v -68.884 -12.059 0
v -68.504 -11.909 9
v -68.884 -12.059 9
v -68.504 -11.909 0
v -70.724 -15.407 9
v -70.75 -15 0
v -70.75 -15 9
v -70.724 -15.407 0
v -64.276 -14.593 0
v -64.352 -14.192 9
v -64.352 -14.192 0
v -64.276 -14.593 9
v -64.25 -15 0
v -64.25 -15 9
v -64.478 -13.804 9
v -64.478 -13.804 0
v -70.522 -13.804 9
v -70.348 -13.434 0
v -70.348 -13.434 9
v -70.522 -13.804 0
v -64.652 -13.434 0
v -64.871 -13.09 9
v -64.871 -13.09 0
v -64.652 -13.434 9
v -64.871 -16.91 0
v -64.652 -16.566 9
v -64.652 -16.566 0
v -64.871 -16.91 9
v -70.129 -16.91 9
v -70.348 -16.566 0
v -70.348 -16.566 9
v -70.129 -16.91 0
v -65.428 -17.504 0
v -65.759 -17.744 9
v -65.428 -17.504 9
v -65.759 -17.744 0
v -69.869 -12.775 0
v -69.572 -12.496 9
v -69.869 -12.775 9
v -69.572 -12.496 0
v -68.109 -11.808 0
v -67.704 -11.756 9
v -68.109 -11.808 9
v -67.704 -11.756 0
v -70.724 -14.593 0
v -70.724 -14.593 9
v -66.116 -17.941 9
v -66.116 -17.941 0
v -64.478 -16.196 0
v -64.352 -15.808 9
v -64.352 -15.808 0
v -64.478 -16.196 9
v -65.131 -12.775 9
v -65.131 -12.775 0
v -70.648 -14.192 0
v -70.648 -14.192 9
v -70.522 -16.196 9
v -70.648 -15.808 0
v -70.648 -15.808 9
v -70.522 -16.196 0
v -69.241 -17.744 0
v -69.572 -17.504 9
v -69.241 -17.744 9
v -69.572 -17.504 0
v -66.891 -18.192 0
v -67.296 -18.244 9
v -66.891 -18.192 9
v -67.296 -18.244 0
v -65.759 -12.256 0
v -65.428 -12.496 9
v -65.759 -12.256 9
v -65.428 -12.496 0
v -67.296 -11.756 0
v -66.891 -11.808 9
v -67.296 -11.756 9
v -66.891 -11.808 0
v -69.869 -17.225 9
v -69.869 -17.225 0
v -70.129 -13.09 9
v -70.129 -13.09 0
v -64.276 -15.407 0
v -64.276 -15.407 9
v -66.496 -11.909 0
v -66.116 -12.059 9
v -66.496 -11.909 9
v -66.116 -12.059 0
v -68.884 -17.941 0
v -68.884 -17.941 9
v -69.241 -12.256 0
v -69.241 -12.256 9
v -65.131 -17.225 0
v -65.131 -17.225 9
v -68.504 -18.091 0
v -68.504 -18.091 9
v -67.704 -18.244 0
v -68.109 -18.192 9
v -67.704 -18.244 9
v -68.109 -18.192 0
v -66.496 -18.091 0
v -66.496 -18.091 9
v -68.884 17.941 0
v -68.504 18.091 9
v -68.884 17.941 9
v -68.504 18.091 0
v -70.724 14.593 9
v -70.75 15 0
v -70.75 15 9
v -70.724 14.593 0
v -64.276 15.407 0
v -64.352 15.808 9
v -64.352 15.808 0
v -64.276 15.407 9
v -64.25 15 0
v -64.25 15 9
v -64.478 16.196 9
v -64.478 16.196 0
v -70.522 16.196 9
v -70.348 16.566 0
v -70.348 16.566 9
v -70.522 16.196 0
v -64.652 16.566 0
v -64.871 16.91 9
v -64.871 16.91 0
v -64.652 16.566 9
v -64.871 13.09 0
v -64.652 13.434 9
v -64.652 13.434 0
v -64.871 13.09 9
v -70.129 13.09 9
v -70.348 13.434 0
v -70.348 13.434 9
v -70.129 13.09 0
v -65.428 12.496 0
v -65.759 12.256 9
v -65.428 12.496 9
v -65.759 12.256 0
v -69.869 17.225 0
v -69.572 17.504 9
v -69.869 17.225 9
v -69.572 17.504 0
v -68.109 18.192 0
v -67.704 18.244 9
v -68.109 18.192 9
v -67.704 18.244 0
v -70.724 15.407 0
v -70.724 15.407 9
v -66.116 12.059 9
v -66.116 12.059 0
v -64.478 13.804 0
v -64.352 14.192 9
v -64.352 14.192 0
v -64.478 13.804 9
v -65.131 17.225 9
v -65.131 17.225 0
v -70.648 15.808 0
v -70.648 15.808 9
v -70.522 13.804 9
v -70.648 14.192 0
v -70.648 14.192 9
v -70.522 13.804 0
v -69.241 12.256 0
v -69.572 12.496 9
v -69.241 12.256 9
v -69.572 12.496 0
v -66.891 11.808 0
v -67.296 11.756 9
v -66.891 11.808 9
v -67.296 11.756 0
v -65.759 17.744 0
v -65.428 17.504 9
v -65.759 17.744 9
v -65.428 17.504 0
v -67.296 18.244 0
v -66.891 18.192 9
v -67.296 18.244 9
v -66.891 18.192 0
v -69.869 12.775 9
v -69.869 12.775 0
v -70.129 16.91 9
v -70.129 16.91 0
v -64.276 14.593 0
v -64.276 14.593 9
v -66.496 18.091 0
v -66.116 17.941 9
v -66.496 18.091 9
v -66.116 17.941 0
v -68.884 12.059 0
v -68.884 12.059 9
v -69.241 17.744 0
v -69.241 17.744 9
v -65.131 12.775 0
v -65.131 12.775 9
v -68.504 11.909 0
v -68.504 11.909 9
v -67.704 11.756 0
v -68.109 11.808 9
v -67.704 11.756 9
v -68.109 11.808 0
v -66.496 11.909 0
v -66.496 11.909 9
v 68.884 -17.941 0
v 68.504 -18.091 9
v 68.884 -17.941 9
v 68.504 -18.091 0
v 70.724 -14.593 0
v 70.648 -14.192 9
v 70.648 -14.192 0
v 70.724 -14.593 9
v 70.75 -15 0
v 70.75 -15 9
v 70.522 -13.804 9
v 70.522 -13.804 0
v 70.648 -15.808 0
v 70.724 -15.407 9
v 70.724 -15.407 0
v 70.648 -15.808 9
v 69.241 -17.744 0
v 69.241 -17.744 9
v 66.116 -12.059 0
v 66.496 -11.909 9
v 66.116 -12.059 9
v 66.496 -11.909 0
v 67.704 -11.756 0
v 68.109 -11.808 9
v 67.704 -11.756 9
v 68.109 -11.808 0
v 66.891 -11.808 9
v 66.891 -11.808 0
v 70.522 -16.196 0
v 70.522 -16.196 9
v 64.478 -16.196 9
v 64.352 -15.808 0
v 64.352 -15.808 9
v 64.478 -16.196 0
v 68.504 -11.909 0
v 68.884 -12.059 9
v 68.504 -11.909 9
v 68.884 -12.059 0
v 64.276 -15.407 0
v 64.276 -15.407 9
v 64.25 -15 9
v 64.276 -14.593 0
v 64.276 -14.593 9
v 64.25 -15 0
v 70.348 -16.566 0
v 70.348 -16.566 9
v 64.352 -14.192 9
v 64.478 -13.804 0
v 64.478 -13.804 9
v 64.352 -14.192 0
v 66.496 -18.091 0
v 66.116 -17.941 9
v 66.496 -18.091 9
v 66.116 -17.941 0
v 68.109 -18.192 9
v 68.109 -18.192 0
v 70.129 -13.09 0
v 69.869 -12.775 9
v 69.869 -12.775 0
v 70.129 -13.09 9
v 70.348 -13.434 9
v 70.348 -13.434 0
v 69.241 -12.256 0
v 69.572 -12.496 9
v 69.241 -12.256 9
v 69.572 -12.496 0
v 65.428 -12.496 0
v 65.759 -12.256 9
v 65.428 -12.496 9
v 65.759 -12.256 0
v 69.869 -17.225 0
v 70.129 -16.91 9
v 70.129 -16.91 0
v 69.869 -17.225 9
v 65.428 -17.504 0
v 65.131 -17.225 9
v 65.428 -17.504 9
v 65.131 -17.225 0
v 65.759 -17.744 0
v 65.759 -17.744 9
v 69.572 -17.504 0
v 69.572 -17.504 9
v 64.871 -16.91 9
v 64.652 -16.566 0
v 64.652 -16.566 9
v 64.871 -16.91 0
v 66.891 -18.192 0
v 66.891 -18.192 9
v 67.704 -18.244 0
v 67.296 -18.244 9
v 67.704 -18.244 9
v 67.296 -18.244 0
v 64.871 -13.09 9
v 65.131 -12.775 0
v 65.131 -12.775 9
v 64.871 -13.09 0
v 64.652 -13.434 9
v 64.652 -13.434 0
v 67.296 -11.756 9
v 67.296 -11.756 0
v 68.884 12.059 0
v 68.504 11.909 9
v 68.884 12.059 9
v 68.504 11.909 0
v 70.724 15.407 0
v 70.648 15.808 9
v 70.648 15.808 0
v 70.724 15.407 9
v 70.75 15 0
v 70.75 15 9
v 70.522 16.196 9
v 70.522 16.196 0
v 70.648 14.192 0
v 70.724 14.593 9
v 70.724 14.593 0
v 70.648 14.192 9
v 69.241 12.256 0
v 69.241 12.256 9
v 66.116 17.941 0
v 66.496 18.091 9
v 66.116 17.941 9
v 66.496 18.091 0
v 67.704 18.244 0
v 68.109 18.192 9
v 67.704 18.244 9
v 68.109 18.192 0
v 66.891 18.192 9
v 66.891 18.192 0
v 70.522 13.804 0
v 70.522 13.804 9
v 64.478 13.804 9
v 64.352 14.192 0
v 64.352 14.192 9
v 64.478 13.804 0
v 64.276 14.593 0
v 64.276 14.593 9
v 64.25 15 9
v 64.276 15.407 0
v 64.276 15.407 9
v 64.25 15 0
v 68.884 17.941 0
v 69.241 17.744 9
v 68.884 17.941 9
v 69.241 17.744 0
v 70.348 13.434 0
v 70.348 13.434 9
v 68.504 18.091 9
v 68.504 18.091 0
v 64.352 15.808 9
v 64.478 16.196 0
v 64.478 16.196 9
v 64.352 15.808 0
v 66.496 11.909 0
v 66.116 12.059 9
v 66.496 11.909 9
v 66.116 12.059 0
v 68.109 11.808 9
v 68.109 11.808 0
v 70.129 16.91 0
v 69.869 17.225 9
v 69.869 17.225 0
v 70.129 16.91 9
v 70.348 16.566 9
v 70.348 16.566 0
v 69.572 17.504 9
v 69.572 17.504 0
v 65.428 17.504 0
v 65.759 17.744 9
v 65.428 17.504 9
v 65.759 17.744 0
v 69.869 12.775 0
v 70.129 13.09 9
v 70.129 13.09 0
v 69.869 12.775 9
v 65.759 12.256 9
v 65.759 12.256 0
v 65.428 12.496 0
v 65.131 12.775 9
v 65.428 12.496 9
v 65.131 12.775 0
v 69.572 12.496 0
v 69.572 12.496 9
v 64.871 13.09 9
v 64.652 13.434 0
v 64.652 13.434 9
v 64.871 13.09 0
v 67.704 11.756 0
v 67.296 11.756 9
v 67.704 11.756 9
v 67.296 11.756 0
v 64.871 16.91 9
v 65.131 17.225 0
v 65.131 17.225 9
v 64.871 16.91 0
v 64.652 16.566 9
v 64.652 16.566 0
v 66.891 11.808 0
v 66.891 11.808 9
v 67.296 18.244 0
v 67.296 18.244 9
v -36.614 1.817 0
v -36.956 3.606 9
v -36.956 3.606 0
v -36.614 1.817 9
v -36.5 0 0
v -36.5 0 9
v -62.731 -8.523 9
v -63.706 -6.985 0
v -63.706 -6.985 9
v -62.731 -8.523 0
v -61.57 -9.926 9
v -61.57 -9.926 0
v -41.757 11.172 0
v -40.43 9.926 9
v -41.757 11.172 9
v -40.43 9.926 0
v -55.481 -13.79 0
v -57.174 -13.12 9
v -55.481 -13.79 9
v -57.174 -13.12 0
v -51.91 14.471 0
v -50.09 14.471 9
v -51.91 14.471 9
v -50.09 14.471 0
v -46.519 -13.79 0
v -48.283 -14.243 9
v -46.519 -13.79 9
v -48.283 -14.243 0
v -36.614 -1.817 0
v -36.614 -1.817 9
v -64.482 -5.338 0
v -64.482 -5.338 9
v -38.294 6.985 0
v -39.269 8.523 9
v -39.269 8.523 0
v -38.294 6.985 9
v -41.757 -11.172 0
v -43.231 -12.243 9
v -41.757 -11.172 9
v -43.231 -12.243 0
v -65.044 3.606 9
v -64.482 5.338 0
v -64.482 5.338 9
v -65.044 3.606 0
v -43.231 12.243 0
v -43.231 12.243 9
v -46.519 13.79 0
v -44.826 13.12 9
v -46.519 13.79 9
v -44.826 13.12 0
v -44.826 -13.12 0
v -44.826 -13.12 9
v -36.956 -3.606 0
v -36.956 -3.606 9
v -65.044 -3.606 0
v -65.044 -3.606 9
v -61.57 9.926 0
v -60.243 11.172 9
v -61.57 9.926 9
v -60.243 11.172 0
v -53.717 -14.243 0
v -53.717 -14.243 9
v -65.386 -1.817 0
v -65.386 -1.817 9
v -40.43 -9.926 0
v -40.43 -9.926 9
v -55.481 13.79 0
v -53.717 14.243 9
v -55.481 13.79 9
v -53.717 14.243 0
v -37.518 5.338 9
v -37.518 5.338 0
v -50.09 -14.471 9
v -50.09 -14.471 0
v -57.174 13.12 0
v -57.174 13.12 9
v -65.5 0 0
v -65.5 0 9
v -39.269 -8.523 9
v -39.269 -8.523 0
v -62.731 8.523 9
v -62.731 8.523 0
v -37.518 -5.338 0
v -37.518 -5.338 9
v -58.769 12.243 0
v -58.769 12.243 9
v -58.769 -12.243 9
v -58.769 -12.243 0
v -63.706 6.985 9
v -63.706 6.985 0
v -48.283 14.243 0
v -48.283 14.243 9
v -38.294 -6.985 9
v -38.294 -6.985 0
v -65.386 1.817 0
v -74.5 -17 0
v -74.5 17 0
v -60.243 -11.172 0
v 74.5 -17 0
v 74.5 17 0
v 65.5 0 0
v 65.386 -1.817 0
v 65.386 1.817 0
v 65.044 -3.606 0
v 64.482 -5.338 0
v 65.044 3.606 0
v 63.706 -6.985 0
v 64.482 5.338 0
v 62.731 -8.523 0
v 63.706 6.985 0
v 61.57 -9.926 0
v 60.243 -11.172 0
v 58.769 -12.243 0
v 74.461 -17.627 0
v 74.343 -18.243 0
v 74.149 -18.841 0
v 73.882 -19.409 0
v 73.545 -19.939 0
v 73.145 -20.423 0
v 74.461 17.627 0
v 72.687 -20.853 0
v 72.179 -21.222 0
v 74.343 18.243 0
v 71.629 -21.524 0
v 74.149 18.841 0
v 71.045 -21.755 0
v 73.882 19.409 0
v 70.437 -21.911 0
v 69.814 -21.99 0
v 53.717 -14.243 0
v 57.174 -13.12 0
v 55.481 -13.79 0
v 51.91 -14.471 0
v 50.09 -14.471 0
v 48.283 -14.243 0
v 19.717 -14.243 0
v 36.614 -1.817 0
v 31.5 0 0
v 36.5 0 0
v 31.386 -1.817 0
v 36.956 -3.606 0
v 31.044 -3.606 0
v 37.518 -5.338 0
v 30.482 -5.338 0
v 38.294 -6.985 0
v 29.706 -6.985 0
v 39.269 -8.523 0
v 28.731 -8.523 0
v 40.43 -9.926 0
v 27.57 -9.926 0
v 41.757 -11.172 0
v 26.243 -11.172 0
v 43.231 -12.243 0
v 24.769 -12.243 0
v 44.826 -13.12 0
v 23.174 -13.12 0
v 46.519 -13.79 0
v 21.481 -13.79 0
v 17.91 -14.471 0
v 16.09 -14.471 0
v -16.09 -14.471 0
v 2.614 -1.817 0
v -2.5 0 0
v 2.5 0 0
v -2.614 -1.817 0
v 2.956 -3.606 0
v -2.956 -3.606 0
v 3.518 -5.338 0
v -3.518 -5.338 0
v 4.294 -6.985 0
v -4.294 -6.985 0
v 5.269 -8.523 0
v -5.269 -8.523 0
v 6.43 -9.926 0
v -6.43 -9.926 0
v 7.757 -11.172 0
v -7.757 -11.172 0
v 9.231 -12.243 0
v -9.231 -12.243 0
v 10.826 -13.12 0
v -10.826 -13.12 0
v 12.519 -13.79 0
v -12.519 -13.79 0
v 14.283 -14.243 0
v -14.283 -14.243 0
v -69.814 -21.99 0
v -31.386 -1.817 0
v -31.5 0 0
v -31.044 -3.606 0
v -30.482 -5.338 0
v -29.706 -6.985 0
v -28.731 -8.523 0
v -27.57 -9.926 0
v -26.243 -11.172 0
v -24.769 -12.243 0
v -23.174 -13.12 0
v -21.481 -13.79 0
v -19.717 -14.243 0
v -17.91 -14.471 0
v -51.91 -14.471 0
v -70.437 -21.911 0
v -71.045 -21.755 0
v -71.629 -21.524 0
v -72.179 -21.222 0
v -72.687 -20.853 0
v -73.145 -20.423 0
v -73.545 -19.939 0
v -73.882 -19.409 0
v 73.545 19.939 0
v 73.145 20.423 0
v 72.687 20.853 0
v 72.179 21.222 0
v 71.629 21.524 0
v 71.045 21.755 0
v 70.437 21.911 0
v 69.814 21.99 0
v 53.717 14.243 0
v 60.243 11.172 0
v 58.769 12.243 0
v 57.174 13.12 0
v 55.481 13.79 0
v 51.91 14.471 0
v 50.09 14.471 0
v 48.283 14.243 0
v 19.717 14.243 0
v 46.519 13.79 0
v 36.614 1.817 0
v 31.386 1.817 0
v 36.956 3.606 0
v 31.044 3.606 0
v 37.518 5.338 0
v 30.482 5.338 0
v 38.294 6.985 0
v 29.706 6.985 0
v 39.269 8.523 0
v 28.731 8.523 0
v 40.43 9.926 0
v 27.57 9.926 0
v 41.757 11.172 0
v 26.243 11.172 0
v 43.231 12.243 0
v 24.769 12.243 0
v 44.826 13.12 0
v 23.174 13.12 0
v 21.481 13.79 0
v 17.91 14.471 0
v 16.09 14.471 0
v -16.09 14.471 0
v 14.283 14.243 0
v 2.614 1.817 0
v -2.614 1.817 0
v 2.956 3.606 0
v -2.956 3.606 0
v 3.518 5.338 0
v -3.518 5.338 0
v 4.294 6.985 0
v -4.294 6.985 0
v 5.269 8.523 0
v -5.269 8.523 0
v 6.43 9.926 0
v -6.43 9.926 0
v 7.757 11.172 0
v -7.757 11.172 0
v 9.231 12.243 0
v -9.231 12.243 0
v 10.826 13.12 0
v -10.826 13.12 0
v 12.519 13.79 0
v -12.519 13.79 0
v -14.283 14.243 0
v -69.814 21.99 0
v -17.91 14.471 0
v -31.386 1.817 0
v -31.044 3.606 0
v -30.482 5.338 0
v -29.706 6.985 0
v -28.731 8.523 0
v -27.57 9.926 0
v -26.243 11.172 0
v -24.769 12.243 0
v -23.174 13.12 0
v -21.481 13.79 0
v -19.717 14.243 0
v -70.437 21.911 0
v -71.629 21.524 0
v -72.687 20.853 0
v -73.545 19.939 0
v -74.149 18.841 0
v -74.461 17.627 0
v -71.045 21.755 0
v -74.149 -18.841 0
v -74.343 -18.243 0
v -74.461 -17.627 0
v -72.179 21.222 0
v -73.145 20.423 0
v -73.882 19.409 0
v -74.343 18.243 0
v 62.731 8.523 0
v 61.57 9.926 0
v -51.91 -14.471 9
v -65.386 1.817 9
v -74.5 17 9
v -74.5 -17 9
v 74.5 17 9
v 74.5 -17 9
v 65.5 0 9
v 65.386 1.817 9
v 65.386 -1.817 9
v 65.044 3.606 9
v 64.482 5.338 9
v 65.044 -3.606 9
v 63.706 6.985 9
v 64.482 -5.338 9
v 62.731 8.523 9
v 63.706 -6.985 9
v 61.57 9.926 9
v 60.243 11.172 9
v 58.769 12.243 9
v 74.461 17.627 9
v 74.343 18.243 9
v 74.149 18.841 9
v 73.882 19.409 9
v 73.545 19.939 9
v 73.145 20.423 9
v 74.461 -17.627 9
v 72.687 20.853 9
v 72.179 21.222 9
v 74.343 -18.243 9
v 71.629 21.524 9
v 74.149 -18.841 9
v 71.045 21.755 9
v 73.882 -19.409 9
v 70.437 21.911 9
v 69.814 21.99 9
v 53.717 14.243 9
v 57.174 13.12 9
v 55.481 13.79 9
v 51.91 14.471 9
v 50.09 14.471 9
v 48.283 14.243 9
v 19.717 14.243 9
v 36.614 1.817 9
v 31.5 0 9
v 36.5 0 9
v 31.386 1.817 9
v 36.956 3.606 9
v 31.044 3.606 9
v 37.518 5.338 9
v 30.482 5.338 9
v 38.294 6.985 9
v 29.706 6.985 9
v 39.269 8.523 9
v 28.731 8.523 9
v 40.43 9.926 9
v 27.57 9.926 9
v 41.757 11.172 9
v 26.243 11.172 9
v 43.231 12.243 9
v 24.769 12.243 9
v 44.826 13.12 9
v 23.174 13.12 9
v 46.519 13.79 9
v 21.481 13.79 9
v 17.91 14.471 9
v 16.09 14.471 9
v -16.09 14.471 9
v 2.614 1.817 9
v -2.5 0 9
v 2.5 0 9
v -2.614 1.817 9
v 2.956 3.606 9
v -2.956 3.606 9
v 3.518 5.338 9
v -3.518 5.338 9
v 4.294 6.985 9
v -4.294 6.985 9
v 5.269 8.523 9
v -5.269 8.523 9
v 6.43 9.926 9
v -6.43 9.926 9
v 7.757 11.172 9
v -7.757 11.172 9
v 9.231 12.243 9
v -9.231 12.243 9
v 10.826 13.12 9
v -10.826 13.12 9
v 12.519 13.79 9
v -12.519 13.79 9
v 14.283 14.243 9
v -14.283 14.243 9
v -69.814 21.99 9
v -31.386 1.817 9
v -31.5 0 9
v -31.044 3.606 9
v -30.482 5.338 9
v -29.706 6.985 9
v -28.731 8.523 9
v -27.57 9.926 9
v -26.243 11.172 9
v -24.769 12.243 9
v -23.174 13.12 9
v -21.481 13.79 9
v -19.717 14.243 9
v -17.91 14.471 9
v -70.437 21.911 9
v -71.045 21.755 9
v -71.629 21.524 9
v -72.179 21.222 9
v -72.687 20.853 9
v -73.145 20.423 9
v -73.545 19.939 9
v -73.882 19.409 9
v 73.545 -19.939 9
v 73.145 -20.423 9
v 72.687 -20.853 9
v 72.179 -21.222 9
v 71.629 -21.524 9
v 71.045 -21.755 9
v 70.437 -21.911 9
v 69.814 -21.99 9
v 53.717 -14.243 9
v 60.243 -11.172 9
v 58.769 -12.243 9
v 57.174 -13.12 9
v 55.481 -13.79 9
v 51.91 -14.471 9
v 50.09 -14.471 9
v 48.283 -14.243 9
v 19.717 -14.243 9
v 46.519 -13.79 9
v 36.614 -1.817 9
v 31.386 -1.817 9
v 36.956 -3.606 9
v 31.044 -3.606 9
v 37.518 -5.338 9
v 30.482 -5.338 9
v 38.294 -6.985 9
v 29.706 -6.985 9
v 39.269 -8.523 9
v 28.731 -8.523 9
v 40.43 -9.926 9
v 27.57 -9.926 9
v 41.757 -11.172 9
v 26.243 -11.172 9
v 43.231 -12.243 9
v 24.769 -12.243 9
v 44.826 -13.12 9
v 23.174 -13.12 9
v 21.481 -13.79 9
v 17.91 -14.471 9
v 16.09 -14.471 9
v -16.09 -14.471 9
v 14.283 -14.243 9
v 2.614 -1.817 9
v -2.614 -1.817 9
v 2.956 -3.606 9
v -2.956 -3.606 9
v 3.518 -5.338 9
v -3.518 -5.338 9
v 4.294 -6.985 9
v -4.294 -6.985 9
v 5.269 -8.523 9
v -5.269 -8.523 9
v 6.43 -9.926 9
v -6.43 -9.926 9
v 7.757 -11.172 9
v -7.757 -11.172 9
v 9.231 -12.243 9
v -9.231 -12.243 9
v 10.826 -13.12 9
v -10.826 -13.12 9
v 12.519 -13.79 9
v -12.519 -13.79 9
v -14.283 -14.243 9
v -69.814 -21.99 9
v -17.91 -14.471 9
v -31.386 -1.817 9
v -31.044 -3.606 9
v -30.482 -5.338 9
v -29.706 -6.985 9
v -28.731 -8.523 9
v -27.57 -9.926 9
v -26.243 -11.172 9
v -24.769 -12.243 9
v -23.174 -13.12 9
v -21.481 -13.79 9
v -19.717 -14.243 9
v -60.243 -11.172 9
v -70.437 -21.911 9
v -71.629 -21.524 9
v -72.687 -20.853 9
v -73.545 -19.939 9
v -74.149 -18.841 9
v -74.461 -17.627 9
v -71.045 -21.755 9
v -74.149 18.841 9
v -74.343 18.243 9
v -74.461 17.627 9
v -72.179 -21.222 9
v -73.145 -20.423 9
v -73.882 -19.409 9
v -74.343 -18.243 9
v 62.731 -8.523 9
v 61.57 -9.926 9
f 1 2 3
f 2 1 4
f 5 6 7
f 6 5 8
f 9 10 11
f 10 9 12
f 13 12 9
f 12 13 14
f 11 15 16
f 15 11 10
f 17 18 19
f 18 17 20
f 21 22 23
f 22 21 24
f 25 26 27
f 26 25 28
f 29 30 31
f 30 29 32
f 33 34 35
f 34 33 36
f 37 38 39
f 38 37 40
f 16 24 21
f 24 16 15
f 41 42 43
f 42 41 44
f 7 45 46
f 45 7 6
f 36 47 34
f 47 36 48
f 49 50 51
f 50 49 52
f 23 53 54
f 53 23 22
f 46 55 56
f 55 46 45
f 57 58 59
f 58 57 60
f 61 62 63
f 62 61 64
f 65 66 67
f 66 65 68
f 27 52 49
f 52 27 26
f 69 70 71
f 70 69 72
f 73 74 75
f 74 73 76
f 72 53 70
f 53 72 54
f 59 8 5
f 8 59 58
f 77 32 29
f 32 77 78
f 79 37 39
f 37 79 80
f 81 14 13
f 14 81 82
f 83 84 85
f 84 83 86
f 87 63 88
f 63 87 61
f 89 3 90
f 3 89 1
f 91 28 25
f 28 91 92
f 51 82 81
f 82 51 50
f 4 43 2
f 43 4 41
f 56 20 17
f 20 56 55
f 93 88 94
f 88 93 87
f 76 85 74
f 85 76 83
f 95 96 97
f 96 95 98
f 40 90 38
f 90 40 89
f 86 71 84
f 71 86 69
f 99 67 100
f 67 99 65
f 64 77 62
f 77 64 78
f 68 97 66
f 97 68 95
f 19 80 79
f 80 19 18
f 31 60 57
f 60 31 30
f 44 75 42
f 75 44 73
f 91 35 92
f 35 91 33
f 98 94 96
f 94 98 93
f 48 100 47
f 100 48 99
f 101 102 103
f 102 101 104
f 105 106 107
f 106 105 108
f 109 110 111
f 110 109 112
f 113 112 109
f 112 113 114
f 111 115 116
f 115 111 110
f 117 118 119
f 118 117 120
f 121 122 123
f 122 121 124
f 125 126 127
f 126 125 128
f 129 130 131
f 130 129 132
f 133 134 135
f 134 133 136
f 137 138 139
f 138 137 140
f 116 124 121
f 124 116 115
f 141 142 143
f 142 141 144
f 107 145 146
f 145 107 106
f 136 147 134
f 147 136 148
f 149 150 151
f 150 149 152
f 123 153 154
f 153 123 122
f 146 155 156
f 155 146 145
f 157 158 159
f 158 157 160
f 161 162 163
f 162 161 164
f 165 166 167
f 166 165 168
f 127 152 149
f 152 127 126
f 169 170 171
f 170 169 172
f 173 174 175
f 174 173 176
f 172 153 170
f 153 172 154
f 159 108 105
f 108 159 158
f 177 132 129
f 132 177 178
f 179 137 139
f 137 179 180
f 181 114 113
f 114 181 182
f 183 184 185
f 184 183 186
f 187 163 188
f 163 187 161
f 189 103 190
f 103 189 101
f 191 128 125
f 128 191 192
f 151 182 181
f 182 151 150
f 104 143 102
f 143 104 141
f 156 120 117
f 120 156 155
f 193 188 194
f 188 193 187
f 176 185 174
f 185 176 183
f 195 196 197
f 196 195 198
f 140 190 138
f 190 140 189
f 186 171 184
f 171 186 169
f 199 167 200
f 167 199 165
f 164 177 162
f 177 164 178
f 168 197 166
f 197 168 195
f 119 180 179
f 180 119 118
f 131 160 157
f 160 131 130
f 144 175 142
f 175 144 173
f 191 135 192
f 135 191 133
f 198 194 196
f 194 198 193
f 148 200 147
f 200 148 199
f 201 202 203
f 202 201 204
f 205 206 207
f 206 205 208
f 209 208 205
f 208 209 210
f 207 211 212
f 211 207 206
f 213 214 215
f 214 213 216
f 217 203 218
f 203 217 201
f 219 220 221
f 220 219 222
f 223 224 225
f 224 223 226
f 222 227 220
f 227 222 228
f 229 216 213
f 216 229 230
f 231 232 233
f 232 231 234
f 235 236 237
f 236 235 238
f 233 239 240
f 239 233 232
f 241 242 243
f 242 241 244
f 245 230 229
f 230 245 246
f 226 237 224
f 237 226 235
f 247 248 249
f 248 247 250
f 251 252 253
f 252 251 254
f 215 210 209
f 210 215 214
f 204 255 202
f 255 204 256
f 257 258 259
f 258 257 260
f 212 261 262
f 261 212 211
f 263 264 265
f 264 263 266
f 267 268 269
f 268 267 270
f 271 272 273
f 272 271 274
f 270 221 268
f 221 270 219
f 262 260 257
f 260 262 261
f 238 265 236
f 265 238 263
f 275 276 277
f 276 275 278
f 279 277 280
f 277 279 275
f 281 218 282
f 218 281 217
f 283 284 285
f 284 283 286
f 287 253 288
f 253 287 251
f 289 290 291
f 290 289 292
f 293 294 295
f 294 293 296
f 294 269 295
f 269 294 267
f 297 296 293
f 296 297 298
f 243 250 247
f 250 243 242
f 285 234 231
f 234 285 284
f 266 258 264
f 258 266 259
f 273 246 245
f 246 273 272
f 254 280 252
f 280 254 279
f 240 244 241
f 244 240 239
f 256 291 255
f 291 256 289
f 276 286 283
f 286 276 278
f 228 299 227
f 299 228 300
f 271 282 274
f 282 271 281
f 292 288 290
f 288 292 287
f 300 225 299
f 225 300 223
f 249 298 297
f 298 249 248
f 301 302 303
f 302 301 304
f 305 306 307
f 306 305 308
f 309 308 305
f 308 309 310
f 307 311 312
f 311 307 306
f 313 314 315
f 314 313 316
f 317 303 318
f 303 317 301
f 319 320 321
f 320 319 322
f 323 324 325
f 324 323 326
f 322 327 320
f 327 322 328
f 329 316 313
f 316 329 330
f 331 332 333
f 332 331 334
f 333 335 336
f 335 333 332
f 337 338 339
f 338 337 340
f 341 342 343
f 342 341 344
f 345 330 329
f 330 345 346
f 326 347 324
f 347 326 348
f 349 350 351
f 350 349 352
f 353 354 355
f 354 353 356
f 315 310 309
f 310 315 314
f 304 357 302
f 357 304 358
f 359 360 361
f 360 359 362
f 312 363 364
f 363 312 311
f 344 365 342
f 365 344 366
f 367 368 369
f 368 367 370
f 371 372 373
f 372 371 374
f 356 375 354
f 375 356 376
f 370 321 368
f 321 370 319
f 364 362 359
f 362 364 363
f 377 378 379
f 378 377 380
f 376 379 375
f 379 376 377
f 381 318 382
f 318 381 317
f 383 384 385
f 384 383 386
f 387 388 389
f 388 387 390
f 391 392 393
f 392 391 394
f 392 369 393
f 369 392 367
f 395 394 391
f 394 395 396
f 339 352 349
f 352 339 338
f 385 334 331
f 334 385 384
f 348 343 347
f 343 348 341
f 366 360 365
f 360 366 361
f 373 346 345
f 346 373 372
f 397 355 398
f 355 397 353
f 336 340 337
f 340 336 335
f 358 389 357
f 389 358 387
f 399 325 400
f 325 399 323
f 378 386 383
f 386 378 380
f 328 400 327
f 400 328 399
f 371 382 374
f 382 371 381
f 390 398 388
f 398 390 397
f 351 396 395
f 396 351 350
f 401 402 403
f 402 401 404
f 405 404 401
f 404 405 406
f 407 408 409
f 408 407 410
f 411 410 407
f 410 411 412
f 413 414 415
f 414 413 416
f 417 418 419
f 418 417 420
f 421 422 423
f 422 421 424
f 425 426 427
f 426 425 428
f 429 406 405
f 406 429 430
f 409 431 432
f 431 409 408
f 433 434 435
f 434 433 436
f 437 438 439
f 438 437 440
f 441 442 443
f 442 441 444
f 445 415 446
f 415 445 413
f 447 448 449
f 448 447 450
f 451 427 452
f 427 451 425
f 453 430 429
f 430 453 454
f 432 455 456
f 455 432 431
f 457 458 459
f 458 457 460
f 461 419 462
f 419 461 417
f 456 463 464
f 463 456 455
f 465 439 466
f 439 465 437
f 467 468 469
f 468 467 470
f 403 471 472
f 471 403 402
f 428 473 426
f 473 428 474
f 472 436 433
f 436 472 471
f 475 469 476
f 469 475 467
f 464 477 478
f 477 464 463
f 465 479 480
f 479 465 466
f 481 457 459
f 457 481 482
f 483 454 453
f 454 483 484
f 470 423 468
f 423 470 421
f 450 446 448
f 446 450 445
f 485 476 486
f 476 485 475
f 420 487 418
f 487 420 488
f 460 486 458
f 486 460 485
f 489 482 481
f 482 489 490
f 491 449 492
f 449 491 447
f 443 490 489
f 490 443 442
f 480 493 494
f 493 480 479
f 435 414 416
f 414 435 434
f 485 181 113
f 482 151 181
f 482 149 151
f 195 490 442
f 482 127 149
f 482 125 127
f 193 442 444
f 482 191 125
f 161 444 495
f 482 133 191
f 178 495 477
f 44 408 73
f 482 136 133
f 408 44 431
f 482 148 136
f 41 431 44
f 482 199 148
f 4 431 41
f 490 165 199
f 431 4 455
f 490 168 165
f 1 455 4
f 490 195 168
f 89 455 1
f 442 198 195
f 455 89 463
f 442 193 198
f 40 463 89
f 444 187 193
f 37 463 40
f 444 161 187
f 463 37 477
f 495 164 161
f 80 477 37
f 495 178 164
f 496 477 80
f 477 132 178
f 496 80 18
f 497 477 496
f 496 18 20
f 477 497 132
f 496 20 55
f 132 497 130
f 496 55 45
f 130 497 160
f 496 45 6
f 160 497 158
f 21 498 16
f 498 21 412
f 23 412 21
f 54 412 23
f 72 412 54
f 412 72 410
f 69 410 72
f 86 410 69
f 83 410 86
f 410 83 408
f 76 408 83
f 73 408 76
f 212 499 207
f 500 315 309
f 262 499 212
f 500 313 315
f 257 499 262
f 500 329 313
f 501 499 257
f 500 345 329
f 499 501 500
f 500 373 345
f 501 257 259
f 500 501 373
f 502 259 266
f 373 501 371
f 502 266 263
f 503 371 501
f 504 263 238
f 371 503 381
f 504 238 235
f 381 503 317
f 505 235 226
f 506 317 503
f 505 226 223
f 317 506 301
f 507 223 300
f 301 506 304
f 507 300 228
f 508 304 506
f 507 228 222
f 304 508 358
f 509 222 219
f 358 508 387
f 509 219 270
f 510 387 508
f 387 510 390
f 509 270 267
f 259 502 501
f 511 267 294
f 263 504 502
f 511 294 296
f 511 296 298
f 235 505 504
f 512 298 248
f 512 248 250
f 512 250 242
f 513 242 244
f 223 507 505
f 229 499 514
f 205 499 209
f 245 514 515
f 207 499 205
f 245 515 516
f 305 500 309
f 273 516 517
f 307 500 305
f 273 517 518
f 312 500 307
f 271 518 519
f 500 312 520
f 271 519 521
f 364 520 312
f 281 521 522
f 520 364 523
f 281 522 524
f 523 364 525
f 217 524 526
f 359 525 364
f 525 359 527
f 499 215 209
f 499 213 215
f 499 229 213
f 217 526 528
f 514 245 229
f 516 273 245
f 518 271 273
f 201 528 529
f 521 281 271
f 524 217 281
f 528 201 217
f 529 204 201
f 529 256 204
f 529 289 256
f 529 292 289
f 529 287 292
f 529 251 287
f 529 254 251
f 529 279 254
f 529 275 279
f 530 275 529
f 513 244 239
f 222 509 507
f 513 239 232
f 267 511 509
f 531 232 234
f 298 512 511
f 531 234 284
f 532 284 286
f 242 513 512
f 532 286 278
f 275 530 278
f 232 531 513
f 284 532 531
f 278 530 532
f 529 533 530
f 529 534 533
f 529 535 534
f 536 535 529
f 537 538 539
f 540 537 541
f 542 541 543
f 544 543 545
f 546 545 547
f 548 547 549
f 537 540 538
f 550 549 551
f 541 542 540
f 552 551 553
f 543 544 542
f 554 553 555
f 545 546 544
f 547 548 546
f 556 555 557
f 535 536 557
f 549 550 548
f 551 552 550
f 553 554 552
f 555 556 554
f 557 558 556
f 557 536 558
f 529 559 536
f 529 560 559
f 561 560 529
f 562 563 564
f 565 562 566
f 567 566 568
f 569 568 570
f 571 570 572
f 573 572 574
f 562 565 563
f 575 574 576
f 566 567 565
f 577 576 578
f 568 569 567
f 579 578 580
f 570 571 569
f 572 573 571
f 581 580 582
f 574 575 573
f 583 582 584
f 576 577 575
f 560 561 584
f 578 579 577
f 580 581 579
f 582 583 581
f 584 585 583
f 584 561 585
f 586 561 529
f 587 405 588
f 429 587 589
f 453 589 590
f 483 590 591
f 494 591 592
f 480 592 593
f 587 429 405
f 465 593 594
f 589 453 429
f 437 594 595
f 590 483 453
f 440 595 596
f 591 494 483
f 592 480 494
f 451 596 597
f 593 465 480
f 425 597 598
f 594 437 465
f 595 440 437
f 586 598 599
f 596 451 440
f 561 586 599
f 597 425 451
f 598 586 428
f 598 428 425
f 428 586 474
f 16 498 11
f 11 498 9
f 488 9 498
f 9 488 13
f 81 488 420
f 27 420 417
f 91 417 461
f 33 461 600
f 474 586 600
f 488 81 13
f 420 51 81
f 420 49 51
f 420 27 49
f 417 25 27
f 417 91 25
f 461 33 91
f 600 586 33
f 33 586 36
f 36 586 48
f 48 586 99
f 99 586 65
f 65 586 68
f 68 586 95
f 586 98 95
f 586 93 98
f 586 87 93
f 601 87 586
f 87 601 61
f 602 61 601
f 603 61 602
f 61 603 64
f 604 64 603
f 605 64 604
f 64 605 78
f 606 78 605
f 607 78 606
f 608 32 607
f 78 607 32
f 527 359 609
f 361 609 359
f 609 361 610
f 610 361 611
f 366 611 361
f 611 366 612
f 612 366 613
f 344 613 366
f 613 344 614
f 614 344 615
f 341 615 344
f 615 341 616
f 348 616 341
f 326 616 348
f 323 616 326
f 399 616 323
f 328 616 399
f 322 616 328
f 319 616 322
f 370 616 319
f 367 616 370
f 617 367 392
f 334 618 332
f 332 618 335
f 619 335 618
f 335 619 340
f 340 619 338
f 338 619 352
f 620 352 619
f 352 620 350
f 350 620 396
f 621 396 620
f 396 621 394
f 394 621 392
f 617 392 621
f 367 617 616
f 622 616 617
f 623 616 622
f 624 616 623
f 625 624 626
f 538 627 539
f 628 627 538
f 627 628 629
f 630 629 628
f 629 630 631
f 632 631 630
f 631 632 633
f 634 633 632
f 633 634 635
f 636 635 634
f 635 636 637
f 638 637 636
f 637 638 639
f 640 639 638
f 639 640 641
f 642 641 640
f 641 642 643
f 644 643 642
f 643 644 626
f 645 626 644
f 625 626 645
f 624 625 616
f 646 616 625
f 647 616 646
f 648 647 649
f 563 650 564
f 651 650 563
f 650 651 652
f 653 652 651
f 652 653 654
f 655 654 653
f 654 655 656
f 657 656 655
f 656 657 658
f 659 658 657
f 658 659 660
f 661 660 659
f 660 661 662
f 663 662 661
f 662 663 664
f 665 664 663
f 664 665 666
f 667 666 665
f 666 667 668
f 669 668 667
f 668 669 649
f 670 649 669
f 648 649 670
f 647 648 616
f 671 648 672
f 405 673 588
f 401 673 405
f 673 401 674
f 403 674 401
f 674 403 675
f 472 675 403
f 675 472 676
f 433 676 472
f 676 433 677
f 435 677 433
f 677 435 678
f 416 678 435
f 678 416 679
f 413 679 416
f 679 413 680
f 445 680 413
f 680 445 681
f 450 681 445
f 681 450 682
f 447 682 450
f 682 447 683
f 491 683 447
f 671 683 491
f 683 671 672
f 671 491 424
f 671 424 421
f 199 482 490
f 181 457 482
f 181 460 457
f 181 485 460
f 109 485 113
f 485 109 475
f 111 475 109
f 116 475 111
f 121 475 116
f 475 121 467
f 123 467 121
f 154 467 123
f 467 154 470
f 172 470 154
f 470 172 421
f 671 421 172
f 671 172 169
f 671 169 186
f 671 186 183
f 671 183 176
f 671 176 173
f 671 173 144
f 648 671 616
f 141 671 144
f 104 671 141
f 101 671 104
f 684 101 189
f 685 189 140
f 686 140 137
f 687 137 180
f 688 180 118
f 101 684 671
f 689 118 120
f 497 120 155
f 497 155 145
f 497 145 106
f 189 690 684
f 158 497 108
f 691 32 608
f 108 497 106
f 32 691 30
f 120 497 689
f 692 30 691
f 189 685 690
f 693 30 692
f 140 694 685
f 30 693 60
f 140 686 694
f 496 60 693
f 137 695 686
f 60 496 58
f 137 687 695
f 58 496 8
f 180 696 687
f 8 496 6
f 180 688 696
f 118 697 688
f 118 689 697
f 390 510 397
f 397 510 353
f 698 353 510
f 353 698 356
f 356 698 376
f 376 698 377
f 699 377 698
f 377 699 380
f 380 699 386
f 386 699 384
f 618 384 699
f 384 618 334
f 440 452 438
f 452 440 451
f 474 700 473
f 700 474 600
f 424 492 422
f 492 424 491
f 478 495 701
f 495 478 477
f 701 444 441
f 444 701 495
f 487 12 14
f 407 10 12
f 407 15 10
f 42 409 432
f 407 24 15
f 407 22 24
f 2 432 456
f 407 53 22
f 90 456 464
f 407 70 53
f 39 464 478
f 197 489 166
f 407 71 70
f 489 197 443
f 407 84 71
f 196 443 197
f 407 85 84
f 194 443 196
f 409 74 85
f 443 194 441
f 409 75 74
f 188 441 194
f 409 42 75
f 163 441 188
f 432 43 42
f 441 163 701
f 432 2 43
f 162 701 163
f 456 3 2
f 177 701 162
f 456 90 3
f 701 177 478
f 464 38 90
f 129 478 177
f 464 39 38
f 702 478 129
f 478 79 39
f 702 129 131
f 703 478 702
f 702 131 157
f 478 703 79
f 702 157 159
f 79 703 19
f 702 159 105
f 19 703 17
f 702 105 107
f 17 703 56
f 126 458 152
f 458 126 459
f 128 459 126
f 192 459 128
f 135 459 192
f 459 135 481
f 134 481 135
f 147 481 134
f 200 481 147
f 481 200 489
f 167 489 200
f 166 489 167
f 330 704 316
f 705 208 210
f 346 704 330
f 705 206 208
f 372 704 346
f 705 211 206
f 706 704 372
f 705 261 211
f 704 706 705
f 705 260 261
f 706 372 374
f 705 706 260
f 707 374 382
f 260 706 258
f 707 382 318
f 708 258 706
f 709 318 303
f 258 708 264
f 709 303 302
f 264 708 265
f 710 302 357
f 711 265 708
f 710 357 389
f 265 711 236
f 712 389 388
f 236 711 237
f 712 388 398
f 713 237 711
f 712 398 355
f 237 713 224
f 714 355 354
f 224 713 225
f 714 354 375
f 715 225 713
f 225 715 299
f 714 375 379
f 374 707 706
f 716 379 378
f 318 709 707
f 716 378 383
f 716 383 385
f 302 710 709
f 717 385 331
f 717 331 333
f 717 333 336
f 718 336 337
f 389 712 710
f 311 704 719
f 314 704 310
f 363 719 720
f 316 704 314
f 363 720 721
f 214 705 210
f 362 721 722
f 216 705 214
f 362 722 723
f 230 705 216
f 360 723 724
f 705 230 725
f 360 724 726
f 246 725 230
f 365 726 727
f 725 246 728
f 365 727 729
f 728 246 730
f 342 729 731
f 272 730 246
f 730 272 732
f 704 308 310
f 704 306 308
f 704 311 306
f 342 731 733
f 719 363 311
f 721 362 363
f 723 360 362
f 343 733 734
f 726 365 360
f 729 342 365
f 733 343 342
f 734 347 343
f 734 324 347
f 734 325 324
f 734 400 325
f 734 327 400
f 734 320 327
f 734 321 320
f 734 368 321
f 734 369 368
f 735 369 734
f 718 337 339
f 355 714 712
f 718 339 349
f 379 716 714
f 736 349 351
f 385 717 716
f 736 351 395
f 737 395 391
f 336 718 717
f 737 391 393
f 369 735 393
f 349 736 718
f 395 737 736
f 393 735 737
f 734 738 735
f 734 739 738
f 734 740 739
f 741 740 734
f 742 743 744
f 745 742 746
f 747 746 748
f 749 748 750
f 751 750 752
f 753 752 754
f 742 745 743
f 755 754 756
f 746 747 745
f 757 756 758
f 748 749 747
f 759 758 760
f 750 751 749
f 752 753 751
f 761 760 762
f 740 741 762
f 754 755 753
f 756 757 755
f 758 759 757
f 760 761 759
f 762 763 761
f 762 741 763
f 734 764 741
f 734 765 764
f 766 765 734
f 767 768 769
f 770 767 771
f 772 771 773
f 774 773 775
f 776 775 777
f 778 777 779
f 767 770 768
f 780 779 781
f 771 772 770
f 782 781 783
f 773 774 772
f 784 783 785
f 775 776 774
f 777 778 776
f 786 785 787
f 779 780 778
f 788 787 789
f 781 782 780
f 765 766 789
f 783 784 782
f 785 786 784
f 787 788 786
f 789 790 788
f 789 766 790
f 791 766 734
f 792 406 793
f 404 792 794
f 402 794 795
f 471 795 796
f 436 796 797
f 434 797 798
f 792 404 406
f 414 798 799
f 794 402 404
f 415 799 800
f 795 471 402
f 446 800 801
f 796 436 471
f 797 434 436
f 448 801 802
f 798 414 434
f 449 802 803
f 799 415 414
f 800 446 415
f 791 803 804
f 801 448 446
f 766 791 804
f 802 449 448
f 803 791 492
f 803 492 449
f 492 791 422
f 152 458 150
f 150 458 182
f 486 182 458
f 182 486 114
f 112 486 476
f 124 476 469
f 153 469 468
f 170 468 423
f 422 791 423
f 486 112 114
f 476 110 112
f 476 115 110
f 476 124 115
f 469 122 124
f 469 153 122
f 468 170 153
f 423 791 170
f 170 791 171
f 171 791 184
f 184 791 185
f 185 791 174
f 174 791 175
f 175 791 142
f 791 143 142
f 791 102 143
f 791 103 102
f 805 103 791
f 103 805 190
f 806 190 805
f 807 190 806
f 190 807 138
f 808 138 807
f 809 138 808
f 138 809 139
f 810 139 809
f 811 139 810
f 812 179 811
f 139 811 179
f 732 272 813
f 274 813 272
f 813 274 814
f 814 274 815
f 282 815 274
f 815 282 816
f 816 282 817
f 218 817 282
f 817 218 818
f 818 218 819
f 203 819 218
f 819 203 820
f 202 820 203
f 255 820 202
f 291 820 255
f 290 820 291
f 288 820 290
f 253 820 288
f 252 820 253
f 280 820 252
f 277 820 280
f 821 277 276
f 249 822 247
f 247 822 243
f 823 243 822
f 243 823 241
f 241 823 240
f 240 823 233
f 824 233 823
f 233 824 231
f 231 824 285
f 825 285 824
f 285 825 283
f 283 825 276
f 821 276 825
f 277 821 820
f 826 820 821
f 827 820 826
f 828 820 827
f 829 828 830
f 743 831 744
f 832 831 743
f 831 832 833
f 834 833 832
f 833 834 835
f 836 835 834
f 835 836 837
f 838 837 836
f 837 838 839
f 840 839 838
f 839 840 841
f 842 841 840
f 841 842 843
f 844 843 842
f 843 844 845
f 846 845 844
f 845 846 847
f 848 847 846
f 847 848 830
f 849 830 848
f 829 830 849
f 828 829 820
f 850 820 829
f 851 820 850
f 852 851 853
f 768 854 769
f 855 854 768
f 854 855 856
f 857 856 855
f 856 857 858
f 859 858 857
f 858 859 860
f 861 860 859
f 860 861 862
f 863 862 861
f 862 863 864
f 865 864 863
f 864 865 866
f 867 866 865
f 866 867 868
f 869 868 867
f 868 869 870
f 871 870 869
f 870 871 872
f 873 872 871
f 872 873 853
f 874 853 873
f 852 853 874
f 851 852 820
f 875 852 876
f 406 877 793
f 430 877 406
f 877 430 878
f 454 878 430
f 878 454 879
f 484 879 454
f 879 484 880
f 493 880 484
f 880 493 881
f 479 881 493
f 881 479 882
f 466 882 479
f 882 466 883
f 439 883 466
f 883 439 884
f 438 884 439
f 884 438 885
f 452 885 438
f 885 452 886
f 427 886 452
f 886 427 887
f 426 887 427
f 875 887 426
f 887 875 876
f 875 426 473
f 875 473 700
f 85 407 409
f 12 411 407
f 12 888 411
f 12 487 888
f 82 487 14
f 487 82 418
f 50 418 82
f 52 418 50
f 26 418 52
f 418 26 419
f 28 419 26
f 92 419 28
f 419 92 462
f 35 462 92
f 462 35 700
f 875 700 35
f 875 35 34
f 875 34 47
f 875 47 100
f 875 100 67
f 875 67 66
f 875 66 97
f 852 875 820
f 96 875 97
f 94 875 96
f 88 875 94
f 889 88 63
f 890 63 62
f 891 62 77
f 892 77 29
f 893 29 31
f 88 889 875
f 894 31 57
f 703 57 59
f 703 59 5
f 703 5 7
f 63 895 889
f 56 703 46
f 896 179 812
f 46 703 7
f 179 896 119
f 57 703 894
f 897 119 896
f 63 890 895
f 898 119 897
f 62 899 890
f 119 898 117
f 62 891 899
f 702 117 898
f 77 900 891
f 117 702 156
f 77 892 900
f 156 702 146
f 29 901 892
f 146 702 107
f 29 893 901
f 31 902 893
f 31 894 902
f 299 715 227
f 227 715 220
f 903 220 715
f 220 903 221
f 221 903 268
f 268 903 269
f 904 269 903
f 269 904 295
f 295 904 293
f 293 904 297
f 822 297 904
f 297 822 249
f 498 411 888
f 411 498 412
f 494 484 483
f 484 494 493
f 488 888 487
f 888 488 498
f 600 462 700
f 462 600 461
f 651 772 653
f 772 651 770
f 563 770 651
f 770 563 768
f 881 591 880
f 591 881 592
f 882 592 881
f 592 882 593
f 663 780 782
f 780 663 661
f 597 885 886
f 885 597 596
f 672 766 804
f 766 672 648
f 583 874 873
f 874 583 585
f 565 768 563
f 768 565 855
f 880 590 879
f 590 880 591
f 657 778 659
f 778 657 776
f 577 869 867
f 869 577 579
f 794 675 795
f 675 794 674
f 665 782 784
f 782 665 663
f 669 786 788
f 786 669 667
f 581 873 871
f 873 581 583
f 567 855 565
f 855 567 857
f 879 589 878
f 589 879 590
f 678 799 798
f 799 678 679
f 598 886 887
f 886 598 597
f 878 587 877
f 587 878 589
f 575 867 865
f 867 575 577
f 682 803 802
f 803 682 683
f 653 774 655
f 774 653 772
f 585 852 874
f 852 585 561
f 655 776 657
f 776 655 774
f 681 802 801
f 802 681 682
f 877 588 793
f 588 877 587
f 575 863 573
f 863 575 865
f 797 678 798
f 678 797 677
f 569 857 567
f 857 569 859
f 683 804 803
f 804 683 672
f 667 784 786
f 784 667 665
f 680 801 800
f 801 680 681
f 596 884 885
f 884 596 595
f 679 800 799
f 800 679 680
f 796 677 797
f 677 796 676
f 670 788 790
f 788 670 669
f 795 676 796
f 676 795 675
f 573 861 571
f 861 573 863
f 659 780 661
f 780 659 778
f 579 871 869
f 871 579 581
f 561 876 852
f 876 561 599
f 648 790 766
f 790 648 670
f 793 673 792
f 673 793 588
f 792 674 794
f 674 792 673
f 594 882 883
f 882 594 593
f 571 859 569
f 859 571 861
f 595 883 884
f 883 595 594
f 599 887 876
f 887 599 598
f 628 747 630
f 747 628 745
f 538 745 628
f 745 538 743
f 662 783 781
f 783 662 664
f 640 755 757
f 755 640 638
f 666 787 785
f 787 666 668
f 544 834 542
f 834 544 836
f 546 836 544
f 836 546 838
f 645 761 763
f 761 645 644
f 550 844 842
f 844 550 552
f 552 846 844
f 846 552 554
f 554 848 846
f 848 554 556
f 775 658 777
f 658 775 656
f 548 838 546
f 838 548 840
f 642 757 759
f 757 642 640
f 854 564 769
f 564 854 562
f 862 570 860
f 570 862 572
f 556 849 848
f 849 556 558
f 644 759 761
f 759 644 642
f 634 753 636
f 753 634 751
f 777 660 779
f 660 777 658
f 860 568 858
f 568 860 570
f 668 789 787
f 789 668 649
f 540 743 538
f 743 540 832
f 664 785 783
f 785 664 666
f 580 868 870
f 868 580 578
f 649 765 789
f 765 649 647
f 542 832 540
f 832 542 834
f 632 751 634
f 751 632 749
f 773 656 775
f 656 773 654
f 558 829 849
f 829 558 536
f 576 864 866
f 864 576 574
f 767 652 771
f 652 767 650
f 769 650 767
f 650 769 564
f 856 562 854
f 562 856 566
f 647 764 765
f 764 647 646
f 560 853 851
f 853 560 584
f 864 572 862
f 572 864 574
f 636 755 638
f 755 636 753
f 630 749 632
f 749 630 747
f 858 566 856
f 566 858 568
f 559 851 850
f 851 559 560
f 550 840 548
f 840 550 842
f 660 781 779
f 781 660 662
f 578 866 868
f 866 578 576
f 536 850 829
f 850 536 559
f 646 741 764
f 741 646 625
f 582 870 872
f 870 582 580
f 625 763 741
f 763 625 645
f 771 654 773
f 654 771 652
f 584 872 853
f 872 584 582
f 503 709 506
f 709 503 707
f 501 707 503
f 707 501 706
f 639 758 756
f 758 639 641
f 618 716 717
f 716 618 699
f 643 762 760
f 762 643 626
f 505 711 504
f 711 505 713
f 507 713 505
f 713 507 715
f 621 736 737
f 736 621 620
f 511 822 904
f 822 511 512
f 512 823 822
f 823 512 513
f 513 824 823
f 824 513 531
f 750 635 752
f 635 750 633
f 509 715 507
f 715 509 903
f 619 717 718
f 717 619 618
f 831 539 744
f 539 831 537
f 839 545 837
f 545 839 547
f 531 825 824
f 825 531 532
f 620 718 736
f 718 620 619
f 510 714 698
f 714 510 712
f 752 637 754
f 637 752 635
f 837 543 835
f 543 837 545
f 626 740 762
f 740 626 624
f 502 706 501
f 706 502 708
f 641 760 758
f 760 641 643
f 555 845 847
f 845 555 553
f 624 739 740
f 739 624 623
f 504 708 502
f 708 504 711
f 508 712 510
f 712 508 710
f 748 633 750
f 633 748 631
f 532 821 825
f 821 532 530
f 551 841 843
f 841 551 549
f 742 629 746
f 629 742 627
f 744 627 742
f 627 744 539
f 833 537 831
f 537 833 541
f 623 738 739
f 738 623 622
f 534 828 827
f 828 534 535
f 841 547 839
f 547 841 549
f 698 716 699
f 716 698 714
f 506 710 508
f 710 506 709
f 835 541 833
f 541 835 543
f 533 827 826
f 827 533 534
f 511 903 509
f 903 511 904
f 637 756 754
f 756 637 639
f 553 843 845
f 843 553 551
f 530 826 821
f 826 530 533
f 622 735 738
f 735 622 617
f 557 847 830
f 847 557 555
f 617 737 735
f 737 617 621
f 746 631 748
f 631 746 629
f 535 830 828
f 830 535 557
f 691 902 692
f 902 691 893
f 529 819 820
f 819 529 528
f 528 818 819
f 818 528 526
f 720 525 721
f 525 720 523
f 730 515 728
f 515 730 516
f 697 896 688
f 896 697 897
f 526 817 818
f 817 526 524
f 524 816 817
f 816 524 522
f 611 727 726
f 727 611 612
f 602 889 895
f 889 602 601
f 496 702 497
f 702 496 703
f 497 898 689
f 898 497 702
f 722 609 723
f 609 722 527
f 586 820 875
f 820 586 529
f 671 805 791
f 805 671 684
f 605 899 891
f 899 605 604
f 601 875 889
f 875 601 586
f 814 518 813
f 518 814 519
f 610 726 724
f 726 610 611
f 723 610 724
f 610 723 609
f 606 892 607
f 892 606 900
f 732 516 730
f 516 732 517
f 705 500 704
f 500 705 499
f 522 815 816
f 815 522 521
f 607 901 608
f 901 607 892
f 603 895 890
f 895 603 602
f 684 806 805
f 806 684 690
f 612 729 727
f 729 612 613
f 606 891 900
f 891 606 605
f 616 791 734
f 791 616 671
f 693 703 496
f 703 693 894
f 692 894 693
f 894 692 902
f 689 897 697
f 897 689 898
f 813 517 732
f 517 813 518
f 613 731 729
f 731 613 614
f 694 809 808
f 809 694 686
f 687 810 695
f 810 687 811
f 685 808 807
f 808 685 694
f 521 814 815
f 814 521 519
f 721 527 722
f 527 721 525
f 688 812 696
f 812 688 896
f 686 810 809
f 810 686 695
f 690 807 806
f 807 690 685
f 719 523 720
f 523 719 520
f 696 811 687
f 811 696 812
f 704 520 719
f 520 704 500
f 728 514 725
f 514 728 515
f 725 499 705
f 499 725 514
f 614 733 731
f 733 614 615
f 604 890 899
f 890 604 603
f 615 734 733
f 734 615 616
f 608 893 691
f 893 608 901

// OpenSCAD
$fn = 50;

difference() {
	union() {
		hull() {
			translate(v = [-69.5, 17.0, 0]) {
				cylinder(h = 9, r = 5);
			}
			translate(v = [69.5, 17.0, 0]) {
				cylinder(h = 9, r = 5);
			}
			translate(v = [-69.5, -17.0, 0]) {
				cylinder(h = 9, r = 5);
			}
			translate(v = [69.5, -17.0, 0]) {
				cylinder(h = 9, r = 5);
			}
		}
	}
	union() {
		translate(v = [-67.5, -15.0, -100.0]) {
			cylinder(h = 200, r = 3.25);
		}
		translate(v = [-67.5, 15.0, -100.0]) {
			cylinder(h = 200, r = 3.25);
		}
		translate(v = [67.5, -15.0, -100.0]) {
			cylinder(h = 200, r = 3.25);
		}
		translate(v = [67.5, 15.0, -100.0]) {
			cylinder(h = 200, r = 3.25);
		}
		translate(v = [-67.5, -15.0, -100.0]) {
			cylinder(h = 200, r = 1.8);
		}
		translate(v = [-67.5, 15.0, -100.0]) {
			cylinder(h = 200, r = 1.8);
		}
		translate(v = [67.5, -15.0, -100.0]) {
			cylinder(h = 200, r = 1.8);
		}
		translate(v = [67.5, 15.0, -100.0]) {
			cylinder(h = 200, r = 1.8);
		}
		translate(v = [-51.0, 0, 0.0]) {
			cylinder(h = 9, r = 14.5);
		}
		translate(v = [-17.0, 0, 0.0]) {
			cylinder(h = 9, r = 14.5);
		}
		translate(v = [17.0, 0, 0.0]) {
			cylinder(h = 9, r = 14.5);
		}
		translate(v = [51.0, 0, 0.0]) {
			cylinder(h = 9, r = 14.5);
		}
	}
}
